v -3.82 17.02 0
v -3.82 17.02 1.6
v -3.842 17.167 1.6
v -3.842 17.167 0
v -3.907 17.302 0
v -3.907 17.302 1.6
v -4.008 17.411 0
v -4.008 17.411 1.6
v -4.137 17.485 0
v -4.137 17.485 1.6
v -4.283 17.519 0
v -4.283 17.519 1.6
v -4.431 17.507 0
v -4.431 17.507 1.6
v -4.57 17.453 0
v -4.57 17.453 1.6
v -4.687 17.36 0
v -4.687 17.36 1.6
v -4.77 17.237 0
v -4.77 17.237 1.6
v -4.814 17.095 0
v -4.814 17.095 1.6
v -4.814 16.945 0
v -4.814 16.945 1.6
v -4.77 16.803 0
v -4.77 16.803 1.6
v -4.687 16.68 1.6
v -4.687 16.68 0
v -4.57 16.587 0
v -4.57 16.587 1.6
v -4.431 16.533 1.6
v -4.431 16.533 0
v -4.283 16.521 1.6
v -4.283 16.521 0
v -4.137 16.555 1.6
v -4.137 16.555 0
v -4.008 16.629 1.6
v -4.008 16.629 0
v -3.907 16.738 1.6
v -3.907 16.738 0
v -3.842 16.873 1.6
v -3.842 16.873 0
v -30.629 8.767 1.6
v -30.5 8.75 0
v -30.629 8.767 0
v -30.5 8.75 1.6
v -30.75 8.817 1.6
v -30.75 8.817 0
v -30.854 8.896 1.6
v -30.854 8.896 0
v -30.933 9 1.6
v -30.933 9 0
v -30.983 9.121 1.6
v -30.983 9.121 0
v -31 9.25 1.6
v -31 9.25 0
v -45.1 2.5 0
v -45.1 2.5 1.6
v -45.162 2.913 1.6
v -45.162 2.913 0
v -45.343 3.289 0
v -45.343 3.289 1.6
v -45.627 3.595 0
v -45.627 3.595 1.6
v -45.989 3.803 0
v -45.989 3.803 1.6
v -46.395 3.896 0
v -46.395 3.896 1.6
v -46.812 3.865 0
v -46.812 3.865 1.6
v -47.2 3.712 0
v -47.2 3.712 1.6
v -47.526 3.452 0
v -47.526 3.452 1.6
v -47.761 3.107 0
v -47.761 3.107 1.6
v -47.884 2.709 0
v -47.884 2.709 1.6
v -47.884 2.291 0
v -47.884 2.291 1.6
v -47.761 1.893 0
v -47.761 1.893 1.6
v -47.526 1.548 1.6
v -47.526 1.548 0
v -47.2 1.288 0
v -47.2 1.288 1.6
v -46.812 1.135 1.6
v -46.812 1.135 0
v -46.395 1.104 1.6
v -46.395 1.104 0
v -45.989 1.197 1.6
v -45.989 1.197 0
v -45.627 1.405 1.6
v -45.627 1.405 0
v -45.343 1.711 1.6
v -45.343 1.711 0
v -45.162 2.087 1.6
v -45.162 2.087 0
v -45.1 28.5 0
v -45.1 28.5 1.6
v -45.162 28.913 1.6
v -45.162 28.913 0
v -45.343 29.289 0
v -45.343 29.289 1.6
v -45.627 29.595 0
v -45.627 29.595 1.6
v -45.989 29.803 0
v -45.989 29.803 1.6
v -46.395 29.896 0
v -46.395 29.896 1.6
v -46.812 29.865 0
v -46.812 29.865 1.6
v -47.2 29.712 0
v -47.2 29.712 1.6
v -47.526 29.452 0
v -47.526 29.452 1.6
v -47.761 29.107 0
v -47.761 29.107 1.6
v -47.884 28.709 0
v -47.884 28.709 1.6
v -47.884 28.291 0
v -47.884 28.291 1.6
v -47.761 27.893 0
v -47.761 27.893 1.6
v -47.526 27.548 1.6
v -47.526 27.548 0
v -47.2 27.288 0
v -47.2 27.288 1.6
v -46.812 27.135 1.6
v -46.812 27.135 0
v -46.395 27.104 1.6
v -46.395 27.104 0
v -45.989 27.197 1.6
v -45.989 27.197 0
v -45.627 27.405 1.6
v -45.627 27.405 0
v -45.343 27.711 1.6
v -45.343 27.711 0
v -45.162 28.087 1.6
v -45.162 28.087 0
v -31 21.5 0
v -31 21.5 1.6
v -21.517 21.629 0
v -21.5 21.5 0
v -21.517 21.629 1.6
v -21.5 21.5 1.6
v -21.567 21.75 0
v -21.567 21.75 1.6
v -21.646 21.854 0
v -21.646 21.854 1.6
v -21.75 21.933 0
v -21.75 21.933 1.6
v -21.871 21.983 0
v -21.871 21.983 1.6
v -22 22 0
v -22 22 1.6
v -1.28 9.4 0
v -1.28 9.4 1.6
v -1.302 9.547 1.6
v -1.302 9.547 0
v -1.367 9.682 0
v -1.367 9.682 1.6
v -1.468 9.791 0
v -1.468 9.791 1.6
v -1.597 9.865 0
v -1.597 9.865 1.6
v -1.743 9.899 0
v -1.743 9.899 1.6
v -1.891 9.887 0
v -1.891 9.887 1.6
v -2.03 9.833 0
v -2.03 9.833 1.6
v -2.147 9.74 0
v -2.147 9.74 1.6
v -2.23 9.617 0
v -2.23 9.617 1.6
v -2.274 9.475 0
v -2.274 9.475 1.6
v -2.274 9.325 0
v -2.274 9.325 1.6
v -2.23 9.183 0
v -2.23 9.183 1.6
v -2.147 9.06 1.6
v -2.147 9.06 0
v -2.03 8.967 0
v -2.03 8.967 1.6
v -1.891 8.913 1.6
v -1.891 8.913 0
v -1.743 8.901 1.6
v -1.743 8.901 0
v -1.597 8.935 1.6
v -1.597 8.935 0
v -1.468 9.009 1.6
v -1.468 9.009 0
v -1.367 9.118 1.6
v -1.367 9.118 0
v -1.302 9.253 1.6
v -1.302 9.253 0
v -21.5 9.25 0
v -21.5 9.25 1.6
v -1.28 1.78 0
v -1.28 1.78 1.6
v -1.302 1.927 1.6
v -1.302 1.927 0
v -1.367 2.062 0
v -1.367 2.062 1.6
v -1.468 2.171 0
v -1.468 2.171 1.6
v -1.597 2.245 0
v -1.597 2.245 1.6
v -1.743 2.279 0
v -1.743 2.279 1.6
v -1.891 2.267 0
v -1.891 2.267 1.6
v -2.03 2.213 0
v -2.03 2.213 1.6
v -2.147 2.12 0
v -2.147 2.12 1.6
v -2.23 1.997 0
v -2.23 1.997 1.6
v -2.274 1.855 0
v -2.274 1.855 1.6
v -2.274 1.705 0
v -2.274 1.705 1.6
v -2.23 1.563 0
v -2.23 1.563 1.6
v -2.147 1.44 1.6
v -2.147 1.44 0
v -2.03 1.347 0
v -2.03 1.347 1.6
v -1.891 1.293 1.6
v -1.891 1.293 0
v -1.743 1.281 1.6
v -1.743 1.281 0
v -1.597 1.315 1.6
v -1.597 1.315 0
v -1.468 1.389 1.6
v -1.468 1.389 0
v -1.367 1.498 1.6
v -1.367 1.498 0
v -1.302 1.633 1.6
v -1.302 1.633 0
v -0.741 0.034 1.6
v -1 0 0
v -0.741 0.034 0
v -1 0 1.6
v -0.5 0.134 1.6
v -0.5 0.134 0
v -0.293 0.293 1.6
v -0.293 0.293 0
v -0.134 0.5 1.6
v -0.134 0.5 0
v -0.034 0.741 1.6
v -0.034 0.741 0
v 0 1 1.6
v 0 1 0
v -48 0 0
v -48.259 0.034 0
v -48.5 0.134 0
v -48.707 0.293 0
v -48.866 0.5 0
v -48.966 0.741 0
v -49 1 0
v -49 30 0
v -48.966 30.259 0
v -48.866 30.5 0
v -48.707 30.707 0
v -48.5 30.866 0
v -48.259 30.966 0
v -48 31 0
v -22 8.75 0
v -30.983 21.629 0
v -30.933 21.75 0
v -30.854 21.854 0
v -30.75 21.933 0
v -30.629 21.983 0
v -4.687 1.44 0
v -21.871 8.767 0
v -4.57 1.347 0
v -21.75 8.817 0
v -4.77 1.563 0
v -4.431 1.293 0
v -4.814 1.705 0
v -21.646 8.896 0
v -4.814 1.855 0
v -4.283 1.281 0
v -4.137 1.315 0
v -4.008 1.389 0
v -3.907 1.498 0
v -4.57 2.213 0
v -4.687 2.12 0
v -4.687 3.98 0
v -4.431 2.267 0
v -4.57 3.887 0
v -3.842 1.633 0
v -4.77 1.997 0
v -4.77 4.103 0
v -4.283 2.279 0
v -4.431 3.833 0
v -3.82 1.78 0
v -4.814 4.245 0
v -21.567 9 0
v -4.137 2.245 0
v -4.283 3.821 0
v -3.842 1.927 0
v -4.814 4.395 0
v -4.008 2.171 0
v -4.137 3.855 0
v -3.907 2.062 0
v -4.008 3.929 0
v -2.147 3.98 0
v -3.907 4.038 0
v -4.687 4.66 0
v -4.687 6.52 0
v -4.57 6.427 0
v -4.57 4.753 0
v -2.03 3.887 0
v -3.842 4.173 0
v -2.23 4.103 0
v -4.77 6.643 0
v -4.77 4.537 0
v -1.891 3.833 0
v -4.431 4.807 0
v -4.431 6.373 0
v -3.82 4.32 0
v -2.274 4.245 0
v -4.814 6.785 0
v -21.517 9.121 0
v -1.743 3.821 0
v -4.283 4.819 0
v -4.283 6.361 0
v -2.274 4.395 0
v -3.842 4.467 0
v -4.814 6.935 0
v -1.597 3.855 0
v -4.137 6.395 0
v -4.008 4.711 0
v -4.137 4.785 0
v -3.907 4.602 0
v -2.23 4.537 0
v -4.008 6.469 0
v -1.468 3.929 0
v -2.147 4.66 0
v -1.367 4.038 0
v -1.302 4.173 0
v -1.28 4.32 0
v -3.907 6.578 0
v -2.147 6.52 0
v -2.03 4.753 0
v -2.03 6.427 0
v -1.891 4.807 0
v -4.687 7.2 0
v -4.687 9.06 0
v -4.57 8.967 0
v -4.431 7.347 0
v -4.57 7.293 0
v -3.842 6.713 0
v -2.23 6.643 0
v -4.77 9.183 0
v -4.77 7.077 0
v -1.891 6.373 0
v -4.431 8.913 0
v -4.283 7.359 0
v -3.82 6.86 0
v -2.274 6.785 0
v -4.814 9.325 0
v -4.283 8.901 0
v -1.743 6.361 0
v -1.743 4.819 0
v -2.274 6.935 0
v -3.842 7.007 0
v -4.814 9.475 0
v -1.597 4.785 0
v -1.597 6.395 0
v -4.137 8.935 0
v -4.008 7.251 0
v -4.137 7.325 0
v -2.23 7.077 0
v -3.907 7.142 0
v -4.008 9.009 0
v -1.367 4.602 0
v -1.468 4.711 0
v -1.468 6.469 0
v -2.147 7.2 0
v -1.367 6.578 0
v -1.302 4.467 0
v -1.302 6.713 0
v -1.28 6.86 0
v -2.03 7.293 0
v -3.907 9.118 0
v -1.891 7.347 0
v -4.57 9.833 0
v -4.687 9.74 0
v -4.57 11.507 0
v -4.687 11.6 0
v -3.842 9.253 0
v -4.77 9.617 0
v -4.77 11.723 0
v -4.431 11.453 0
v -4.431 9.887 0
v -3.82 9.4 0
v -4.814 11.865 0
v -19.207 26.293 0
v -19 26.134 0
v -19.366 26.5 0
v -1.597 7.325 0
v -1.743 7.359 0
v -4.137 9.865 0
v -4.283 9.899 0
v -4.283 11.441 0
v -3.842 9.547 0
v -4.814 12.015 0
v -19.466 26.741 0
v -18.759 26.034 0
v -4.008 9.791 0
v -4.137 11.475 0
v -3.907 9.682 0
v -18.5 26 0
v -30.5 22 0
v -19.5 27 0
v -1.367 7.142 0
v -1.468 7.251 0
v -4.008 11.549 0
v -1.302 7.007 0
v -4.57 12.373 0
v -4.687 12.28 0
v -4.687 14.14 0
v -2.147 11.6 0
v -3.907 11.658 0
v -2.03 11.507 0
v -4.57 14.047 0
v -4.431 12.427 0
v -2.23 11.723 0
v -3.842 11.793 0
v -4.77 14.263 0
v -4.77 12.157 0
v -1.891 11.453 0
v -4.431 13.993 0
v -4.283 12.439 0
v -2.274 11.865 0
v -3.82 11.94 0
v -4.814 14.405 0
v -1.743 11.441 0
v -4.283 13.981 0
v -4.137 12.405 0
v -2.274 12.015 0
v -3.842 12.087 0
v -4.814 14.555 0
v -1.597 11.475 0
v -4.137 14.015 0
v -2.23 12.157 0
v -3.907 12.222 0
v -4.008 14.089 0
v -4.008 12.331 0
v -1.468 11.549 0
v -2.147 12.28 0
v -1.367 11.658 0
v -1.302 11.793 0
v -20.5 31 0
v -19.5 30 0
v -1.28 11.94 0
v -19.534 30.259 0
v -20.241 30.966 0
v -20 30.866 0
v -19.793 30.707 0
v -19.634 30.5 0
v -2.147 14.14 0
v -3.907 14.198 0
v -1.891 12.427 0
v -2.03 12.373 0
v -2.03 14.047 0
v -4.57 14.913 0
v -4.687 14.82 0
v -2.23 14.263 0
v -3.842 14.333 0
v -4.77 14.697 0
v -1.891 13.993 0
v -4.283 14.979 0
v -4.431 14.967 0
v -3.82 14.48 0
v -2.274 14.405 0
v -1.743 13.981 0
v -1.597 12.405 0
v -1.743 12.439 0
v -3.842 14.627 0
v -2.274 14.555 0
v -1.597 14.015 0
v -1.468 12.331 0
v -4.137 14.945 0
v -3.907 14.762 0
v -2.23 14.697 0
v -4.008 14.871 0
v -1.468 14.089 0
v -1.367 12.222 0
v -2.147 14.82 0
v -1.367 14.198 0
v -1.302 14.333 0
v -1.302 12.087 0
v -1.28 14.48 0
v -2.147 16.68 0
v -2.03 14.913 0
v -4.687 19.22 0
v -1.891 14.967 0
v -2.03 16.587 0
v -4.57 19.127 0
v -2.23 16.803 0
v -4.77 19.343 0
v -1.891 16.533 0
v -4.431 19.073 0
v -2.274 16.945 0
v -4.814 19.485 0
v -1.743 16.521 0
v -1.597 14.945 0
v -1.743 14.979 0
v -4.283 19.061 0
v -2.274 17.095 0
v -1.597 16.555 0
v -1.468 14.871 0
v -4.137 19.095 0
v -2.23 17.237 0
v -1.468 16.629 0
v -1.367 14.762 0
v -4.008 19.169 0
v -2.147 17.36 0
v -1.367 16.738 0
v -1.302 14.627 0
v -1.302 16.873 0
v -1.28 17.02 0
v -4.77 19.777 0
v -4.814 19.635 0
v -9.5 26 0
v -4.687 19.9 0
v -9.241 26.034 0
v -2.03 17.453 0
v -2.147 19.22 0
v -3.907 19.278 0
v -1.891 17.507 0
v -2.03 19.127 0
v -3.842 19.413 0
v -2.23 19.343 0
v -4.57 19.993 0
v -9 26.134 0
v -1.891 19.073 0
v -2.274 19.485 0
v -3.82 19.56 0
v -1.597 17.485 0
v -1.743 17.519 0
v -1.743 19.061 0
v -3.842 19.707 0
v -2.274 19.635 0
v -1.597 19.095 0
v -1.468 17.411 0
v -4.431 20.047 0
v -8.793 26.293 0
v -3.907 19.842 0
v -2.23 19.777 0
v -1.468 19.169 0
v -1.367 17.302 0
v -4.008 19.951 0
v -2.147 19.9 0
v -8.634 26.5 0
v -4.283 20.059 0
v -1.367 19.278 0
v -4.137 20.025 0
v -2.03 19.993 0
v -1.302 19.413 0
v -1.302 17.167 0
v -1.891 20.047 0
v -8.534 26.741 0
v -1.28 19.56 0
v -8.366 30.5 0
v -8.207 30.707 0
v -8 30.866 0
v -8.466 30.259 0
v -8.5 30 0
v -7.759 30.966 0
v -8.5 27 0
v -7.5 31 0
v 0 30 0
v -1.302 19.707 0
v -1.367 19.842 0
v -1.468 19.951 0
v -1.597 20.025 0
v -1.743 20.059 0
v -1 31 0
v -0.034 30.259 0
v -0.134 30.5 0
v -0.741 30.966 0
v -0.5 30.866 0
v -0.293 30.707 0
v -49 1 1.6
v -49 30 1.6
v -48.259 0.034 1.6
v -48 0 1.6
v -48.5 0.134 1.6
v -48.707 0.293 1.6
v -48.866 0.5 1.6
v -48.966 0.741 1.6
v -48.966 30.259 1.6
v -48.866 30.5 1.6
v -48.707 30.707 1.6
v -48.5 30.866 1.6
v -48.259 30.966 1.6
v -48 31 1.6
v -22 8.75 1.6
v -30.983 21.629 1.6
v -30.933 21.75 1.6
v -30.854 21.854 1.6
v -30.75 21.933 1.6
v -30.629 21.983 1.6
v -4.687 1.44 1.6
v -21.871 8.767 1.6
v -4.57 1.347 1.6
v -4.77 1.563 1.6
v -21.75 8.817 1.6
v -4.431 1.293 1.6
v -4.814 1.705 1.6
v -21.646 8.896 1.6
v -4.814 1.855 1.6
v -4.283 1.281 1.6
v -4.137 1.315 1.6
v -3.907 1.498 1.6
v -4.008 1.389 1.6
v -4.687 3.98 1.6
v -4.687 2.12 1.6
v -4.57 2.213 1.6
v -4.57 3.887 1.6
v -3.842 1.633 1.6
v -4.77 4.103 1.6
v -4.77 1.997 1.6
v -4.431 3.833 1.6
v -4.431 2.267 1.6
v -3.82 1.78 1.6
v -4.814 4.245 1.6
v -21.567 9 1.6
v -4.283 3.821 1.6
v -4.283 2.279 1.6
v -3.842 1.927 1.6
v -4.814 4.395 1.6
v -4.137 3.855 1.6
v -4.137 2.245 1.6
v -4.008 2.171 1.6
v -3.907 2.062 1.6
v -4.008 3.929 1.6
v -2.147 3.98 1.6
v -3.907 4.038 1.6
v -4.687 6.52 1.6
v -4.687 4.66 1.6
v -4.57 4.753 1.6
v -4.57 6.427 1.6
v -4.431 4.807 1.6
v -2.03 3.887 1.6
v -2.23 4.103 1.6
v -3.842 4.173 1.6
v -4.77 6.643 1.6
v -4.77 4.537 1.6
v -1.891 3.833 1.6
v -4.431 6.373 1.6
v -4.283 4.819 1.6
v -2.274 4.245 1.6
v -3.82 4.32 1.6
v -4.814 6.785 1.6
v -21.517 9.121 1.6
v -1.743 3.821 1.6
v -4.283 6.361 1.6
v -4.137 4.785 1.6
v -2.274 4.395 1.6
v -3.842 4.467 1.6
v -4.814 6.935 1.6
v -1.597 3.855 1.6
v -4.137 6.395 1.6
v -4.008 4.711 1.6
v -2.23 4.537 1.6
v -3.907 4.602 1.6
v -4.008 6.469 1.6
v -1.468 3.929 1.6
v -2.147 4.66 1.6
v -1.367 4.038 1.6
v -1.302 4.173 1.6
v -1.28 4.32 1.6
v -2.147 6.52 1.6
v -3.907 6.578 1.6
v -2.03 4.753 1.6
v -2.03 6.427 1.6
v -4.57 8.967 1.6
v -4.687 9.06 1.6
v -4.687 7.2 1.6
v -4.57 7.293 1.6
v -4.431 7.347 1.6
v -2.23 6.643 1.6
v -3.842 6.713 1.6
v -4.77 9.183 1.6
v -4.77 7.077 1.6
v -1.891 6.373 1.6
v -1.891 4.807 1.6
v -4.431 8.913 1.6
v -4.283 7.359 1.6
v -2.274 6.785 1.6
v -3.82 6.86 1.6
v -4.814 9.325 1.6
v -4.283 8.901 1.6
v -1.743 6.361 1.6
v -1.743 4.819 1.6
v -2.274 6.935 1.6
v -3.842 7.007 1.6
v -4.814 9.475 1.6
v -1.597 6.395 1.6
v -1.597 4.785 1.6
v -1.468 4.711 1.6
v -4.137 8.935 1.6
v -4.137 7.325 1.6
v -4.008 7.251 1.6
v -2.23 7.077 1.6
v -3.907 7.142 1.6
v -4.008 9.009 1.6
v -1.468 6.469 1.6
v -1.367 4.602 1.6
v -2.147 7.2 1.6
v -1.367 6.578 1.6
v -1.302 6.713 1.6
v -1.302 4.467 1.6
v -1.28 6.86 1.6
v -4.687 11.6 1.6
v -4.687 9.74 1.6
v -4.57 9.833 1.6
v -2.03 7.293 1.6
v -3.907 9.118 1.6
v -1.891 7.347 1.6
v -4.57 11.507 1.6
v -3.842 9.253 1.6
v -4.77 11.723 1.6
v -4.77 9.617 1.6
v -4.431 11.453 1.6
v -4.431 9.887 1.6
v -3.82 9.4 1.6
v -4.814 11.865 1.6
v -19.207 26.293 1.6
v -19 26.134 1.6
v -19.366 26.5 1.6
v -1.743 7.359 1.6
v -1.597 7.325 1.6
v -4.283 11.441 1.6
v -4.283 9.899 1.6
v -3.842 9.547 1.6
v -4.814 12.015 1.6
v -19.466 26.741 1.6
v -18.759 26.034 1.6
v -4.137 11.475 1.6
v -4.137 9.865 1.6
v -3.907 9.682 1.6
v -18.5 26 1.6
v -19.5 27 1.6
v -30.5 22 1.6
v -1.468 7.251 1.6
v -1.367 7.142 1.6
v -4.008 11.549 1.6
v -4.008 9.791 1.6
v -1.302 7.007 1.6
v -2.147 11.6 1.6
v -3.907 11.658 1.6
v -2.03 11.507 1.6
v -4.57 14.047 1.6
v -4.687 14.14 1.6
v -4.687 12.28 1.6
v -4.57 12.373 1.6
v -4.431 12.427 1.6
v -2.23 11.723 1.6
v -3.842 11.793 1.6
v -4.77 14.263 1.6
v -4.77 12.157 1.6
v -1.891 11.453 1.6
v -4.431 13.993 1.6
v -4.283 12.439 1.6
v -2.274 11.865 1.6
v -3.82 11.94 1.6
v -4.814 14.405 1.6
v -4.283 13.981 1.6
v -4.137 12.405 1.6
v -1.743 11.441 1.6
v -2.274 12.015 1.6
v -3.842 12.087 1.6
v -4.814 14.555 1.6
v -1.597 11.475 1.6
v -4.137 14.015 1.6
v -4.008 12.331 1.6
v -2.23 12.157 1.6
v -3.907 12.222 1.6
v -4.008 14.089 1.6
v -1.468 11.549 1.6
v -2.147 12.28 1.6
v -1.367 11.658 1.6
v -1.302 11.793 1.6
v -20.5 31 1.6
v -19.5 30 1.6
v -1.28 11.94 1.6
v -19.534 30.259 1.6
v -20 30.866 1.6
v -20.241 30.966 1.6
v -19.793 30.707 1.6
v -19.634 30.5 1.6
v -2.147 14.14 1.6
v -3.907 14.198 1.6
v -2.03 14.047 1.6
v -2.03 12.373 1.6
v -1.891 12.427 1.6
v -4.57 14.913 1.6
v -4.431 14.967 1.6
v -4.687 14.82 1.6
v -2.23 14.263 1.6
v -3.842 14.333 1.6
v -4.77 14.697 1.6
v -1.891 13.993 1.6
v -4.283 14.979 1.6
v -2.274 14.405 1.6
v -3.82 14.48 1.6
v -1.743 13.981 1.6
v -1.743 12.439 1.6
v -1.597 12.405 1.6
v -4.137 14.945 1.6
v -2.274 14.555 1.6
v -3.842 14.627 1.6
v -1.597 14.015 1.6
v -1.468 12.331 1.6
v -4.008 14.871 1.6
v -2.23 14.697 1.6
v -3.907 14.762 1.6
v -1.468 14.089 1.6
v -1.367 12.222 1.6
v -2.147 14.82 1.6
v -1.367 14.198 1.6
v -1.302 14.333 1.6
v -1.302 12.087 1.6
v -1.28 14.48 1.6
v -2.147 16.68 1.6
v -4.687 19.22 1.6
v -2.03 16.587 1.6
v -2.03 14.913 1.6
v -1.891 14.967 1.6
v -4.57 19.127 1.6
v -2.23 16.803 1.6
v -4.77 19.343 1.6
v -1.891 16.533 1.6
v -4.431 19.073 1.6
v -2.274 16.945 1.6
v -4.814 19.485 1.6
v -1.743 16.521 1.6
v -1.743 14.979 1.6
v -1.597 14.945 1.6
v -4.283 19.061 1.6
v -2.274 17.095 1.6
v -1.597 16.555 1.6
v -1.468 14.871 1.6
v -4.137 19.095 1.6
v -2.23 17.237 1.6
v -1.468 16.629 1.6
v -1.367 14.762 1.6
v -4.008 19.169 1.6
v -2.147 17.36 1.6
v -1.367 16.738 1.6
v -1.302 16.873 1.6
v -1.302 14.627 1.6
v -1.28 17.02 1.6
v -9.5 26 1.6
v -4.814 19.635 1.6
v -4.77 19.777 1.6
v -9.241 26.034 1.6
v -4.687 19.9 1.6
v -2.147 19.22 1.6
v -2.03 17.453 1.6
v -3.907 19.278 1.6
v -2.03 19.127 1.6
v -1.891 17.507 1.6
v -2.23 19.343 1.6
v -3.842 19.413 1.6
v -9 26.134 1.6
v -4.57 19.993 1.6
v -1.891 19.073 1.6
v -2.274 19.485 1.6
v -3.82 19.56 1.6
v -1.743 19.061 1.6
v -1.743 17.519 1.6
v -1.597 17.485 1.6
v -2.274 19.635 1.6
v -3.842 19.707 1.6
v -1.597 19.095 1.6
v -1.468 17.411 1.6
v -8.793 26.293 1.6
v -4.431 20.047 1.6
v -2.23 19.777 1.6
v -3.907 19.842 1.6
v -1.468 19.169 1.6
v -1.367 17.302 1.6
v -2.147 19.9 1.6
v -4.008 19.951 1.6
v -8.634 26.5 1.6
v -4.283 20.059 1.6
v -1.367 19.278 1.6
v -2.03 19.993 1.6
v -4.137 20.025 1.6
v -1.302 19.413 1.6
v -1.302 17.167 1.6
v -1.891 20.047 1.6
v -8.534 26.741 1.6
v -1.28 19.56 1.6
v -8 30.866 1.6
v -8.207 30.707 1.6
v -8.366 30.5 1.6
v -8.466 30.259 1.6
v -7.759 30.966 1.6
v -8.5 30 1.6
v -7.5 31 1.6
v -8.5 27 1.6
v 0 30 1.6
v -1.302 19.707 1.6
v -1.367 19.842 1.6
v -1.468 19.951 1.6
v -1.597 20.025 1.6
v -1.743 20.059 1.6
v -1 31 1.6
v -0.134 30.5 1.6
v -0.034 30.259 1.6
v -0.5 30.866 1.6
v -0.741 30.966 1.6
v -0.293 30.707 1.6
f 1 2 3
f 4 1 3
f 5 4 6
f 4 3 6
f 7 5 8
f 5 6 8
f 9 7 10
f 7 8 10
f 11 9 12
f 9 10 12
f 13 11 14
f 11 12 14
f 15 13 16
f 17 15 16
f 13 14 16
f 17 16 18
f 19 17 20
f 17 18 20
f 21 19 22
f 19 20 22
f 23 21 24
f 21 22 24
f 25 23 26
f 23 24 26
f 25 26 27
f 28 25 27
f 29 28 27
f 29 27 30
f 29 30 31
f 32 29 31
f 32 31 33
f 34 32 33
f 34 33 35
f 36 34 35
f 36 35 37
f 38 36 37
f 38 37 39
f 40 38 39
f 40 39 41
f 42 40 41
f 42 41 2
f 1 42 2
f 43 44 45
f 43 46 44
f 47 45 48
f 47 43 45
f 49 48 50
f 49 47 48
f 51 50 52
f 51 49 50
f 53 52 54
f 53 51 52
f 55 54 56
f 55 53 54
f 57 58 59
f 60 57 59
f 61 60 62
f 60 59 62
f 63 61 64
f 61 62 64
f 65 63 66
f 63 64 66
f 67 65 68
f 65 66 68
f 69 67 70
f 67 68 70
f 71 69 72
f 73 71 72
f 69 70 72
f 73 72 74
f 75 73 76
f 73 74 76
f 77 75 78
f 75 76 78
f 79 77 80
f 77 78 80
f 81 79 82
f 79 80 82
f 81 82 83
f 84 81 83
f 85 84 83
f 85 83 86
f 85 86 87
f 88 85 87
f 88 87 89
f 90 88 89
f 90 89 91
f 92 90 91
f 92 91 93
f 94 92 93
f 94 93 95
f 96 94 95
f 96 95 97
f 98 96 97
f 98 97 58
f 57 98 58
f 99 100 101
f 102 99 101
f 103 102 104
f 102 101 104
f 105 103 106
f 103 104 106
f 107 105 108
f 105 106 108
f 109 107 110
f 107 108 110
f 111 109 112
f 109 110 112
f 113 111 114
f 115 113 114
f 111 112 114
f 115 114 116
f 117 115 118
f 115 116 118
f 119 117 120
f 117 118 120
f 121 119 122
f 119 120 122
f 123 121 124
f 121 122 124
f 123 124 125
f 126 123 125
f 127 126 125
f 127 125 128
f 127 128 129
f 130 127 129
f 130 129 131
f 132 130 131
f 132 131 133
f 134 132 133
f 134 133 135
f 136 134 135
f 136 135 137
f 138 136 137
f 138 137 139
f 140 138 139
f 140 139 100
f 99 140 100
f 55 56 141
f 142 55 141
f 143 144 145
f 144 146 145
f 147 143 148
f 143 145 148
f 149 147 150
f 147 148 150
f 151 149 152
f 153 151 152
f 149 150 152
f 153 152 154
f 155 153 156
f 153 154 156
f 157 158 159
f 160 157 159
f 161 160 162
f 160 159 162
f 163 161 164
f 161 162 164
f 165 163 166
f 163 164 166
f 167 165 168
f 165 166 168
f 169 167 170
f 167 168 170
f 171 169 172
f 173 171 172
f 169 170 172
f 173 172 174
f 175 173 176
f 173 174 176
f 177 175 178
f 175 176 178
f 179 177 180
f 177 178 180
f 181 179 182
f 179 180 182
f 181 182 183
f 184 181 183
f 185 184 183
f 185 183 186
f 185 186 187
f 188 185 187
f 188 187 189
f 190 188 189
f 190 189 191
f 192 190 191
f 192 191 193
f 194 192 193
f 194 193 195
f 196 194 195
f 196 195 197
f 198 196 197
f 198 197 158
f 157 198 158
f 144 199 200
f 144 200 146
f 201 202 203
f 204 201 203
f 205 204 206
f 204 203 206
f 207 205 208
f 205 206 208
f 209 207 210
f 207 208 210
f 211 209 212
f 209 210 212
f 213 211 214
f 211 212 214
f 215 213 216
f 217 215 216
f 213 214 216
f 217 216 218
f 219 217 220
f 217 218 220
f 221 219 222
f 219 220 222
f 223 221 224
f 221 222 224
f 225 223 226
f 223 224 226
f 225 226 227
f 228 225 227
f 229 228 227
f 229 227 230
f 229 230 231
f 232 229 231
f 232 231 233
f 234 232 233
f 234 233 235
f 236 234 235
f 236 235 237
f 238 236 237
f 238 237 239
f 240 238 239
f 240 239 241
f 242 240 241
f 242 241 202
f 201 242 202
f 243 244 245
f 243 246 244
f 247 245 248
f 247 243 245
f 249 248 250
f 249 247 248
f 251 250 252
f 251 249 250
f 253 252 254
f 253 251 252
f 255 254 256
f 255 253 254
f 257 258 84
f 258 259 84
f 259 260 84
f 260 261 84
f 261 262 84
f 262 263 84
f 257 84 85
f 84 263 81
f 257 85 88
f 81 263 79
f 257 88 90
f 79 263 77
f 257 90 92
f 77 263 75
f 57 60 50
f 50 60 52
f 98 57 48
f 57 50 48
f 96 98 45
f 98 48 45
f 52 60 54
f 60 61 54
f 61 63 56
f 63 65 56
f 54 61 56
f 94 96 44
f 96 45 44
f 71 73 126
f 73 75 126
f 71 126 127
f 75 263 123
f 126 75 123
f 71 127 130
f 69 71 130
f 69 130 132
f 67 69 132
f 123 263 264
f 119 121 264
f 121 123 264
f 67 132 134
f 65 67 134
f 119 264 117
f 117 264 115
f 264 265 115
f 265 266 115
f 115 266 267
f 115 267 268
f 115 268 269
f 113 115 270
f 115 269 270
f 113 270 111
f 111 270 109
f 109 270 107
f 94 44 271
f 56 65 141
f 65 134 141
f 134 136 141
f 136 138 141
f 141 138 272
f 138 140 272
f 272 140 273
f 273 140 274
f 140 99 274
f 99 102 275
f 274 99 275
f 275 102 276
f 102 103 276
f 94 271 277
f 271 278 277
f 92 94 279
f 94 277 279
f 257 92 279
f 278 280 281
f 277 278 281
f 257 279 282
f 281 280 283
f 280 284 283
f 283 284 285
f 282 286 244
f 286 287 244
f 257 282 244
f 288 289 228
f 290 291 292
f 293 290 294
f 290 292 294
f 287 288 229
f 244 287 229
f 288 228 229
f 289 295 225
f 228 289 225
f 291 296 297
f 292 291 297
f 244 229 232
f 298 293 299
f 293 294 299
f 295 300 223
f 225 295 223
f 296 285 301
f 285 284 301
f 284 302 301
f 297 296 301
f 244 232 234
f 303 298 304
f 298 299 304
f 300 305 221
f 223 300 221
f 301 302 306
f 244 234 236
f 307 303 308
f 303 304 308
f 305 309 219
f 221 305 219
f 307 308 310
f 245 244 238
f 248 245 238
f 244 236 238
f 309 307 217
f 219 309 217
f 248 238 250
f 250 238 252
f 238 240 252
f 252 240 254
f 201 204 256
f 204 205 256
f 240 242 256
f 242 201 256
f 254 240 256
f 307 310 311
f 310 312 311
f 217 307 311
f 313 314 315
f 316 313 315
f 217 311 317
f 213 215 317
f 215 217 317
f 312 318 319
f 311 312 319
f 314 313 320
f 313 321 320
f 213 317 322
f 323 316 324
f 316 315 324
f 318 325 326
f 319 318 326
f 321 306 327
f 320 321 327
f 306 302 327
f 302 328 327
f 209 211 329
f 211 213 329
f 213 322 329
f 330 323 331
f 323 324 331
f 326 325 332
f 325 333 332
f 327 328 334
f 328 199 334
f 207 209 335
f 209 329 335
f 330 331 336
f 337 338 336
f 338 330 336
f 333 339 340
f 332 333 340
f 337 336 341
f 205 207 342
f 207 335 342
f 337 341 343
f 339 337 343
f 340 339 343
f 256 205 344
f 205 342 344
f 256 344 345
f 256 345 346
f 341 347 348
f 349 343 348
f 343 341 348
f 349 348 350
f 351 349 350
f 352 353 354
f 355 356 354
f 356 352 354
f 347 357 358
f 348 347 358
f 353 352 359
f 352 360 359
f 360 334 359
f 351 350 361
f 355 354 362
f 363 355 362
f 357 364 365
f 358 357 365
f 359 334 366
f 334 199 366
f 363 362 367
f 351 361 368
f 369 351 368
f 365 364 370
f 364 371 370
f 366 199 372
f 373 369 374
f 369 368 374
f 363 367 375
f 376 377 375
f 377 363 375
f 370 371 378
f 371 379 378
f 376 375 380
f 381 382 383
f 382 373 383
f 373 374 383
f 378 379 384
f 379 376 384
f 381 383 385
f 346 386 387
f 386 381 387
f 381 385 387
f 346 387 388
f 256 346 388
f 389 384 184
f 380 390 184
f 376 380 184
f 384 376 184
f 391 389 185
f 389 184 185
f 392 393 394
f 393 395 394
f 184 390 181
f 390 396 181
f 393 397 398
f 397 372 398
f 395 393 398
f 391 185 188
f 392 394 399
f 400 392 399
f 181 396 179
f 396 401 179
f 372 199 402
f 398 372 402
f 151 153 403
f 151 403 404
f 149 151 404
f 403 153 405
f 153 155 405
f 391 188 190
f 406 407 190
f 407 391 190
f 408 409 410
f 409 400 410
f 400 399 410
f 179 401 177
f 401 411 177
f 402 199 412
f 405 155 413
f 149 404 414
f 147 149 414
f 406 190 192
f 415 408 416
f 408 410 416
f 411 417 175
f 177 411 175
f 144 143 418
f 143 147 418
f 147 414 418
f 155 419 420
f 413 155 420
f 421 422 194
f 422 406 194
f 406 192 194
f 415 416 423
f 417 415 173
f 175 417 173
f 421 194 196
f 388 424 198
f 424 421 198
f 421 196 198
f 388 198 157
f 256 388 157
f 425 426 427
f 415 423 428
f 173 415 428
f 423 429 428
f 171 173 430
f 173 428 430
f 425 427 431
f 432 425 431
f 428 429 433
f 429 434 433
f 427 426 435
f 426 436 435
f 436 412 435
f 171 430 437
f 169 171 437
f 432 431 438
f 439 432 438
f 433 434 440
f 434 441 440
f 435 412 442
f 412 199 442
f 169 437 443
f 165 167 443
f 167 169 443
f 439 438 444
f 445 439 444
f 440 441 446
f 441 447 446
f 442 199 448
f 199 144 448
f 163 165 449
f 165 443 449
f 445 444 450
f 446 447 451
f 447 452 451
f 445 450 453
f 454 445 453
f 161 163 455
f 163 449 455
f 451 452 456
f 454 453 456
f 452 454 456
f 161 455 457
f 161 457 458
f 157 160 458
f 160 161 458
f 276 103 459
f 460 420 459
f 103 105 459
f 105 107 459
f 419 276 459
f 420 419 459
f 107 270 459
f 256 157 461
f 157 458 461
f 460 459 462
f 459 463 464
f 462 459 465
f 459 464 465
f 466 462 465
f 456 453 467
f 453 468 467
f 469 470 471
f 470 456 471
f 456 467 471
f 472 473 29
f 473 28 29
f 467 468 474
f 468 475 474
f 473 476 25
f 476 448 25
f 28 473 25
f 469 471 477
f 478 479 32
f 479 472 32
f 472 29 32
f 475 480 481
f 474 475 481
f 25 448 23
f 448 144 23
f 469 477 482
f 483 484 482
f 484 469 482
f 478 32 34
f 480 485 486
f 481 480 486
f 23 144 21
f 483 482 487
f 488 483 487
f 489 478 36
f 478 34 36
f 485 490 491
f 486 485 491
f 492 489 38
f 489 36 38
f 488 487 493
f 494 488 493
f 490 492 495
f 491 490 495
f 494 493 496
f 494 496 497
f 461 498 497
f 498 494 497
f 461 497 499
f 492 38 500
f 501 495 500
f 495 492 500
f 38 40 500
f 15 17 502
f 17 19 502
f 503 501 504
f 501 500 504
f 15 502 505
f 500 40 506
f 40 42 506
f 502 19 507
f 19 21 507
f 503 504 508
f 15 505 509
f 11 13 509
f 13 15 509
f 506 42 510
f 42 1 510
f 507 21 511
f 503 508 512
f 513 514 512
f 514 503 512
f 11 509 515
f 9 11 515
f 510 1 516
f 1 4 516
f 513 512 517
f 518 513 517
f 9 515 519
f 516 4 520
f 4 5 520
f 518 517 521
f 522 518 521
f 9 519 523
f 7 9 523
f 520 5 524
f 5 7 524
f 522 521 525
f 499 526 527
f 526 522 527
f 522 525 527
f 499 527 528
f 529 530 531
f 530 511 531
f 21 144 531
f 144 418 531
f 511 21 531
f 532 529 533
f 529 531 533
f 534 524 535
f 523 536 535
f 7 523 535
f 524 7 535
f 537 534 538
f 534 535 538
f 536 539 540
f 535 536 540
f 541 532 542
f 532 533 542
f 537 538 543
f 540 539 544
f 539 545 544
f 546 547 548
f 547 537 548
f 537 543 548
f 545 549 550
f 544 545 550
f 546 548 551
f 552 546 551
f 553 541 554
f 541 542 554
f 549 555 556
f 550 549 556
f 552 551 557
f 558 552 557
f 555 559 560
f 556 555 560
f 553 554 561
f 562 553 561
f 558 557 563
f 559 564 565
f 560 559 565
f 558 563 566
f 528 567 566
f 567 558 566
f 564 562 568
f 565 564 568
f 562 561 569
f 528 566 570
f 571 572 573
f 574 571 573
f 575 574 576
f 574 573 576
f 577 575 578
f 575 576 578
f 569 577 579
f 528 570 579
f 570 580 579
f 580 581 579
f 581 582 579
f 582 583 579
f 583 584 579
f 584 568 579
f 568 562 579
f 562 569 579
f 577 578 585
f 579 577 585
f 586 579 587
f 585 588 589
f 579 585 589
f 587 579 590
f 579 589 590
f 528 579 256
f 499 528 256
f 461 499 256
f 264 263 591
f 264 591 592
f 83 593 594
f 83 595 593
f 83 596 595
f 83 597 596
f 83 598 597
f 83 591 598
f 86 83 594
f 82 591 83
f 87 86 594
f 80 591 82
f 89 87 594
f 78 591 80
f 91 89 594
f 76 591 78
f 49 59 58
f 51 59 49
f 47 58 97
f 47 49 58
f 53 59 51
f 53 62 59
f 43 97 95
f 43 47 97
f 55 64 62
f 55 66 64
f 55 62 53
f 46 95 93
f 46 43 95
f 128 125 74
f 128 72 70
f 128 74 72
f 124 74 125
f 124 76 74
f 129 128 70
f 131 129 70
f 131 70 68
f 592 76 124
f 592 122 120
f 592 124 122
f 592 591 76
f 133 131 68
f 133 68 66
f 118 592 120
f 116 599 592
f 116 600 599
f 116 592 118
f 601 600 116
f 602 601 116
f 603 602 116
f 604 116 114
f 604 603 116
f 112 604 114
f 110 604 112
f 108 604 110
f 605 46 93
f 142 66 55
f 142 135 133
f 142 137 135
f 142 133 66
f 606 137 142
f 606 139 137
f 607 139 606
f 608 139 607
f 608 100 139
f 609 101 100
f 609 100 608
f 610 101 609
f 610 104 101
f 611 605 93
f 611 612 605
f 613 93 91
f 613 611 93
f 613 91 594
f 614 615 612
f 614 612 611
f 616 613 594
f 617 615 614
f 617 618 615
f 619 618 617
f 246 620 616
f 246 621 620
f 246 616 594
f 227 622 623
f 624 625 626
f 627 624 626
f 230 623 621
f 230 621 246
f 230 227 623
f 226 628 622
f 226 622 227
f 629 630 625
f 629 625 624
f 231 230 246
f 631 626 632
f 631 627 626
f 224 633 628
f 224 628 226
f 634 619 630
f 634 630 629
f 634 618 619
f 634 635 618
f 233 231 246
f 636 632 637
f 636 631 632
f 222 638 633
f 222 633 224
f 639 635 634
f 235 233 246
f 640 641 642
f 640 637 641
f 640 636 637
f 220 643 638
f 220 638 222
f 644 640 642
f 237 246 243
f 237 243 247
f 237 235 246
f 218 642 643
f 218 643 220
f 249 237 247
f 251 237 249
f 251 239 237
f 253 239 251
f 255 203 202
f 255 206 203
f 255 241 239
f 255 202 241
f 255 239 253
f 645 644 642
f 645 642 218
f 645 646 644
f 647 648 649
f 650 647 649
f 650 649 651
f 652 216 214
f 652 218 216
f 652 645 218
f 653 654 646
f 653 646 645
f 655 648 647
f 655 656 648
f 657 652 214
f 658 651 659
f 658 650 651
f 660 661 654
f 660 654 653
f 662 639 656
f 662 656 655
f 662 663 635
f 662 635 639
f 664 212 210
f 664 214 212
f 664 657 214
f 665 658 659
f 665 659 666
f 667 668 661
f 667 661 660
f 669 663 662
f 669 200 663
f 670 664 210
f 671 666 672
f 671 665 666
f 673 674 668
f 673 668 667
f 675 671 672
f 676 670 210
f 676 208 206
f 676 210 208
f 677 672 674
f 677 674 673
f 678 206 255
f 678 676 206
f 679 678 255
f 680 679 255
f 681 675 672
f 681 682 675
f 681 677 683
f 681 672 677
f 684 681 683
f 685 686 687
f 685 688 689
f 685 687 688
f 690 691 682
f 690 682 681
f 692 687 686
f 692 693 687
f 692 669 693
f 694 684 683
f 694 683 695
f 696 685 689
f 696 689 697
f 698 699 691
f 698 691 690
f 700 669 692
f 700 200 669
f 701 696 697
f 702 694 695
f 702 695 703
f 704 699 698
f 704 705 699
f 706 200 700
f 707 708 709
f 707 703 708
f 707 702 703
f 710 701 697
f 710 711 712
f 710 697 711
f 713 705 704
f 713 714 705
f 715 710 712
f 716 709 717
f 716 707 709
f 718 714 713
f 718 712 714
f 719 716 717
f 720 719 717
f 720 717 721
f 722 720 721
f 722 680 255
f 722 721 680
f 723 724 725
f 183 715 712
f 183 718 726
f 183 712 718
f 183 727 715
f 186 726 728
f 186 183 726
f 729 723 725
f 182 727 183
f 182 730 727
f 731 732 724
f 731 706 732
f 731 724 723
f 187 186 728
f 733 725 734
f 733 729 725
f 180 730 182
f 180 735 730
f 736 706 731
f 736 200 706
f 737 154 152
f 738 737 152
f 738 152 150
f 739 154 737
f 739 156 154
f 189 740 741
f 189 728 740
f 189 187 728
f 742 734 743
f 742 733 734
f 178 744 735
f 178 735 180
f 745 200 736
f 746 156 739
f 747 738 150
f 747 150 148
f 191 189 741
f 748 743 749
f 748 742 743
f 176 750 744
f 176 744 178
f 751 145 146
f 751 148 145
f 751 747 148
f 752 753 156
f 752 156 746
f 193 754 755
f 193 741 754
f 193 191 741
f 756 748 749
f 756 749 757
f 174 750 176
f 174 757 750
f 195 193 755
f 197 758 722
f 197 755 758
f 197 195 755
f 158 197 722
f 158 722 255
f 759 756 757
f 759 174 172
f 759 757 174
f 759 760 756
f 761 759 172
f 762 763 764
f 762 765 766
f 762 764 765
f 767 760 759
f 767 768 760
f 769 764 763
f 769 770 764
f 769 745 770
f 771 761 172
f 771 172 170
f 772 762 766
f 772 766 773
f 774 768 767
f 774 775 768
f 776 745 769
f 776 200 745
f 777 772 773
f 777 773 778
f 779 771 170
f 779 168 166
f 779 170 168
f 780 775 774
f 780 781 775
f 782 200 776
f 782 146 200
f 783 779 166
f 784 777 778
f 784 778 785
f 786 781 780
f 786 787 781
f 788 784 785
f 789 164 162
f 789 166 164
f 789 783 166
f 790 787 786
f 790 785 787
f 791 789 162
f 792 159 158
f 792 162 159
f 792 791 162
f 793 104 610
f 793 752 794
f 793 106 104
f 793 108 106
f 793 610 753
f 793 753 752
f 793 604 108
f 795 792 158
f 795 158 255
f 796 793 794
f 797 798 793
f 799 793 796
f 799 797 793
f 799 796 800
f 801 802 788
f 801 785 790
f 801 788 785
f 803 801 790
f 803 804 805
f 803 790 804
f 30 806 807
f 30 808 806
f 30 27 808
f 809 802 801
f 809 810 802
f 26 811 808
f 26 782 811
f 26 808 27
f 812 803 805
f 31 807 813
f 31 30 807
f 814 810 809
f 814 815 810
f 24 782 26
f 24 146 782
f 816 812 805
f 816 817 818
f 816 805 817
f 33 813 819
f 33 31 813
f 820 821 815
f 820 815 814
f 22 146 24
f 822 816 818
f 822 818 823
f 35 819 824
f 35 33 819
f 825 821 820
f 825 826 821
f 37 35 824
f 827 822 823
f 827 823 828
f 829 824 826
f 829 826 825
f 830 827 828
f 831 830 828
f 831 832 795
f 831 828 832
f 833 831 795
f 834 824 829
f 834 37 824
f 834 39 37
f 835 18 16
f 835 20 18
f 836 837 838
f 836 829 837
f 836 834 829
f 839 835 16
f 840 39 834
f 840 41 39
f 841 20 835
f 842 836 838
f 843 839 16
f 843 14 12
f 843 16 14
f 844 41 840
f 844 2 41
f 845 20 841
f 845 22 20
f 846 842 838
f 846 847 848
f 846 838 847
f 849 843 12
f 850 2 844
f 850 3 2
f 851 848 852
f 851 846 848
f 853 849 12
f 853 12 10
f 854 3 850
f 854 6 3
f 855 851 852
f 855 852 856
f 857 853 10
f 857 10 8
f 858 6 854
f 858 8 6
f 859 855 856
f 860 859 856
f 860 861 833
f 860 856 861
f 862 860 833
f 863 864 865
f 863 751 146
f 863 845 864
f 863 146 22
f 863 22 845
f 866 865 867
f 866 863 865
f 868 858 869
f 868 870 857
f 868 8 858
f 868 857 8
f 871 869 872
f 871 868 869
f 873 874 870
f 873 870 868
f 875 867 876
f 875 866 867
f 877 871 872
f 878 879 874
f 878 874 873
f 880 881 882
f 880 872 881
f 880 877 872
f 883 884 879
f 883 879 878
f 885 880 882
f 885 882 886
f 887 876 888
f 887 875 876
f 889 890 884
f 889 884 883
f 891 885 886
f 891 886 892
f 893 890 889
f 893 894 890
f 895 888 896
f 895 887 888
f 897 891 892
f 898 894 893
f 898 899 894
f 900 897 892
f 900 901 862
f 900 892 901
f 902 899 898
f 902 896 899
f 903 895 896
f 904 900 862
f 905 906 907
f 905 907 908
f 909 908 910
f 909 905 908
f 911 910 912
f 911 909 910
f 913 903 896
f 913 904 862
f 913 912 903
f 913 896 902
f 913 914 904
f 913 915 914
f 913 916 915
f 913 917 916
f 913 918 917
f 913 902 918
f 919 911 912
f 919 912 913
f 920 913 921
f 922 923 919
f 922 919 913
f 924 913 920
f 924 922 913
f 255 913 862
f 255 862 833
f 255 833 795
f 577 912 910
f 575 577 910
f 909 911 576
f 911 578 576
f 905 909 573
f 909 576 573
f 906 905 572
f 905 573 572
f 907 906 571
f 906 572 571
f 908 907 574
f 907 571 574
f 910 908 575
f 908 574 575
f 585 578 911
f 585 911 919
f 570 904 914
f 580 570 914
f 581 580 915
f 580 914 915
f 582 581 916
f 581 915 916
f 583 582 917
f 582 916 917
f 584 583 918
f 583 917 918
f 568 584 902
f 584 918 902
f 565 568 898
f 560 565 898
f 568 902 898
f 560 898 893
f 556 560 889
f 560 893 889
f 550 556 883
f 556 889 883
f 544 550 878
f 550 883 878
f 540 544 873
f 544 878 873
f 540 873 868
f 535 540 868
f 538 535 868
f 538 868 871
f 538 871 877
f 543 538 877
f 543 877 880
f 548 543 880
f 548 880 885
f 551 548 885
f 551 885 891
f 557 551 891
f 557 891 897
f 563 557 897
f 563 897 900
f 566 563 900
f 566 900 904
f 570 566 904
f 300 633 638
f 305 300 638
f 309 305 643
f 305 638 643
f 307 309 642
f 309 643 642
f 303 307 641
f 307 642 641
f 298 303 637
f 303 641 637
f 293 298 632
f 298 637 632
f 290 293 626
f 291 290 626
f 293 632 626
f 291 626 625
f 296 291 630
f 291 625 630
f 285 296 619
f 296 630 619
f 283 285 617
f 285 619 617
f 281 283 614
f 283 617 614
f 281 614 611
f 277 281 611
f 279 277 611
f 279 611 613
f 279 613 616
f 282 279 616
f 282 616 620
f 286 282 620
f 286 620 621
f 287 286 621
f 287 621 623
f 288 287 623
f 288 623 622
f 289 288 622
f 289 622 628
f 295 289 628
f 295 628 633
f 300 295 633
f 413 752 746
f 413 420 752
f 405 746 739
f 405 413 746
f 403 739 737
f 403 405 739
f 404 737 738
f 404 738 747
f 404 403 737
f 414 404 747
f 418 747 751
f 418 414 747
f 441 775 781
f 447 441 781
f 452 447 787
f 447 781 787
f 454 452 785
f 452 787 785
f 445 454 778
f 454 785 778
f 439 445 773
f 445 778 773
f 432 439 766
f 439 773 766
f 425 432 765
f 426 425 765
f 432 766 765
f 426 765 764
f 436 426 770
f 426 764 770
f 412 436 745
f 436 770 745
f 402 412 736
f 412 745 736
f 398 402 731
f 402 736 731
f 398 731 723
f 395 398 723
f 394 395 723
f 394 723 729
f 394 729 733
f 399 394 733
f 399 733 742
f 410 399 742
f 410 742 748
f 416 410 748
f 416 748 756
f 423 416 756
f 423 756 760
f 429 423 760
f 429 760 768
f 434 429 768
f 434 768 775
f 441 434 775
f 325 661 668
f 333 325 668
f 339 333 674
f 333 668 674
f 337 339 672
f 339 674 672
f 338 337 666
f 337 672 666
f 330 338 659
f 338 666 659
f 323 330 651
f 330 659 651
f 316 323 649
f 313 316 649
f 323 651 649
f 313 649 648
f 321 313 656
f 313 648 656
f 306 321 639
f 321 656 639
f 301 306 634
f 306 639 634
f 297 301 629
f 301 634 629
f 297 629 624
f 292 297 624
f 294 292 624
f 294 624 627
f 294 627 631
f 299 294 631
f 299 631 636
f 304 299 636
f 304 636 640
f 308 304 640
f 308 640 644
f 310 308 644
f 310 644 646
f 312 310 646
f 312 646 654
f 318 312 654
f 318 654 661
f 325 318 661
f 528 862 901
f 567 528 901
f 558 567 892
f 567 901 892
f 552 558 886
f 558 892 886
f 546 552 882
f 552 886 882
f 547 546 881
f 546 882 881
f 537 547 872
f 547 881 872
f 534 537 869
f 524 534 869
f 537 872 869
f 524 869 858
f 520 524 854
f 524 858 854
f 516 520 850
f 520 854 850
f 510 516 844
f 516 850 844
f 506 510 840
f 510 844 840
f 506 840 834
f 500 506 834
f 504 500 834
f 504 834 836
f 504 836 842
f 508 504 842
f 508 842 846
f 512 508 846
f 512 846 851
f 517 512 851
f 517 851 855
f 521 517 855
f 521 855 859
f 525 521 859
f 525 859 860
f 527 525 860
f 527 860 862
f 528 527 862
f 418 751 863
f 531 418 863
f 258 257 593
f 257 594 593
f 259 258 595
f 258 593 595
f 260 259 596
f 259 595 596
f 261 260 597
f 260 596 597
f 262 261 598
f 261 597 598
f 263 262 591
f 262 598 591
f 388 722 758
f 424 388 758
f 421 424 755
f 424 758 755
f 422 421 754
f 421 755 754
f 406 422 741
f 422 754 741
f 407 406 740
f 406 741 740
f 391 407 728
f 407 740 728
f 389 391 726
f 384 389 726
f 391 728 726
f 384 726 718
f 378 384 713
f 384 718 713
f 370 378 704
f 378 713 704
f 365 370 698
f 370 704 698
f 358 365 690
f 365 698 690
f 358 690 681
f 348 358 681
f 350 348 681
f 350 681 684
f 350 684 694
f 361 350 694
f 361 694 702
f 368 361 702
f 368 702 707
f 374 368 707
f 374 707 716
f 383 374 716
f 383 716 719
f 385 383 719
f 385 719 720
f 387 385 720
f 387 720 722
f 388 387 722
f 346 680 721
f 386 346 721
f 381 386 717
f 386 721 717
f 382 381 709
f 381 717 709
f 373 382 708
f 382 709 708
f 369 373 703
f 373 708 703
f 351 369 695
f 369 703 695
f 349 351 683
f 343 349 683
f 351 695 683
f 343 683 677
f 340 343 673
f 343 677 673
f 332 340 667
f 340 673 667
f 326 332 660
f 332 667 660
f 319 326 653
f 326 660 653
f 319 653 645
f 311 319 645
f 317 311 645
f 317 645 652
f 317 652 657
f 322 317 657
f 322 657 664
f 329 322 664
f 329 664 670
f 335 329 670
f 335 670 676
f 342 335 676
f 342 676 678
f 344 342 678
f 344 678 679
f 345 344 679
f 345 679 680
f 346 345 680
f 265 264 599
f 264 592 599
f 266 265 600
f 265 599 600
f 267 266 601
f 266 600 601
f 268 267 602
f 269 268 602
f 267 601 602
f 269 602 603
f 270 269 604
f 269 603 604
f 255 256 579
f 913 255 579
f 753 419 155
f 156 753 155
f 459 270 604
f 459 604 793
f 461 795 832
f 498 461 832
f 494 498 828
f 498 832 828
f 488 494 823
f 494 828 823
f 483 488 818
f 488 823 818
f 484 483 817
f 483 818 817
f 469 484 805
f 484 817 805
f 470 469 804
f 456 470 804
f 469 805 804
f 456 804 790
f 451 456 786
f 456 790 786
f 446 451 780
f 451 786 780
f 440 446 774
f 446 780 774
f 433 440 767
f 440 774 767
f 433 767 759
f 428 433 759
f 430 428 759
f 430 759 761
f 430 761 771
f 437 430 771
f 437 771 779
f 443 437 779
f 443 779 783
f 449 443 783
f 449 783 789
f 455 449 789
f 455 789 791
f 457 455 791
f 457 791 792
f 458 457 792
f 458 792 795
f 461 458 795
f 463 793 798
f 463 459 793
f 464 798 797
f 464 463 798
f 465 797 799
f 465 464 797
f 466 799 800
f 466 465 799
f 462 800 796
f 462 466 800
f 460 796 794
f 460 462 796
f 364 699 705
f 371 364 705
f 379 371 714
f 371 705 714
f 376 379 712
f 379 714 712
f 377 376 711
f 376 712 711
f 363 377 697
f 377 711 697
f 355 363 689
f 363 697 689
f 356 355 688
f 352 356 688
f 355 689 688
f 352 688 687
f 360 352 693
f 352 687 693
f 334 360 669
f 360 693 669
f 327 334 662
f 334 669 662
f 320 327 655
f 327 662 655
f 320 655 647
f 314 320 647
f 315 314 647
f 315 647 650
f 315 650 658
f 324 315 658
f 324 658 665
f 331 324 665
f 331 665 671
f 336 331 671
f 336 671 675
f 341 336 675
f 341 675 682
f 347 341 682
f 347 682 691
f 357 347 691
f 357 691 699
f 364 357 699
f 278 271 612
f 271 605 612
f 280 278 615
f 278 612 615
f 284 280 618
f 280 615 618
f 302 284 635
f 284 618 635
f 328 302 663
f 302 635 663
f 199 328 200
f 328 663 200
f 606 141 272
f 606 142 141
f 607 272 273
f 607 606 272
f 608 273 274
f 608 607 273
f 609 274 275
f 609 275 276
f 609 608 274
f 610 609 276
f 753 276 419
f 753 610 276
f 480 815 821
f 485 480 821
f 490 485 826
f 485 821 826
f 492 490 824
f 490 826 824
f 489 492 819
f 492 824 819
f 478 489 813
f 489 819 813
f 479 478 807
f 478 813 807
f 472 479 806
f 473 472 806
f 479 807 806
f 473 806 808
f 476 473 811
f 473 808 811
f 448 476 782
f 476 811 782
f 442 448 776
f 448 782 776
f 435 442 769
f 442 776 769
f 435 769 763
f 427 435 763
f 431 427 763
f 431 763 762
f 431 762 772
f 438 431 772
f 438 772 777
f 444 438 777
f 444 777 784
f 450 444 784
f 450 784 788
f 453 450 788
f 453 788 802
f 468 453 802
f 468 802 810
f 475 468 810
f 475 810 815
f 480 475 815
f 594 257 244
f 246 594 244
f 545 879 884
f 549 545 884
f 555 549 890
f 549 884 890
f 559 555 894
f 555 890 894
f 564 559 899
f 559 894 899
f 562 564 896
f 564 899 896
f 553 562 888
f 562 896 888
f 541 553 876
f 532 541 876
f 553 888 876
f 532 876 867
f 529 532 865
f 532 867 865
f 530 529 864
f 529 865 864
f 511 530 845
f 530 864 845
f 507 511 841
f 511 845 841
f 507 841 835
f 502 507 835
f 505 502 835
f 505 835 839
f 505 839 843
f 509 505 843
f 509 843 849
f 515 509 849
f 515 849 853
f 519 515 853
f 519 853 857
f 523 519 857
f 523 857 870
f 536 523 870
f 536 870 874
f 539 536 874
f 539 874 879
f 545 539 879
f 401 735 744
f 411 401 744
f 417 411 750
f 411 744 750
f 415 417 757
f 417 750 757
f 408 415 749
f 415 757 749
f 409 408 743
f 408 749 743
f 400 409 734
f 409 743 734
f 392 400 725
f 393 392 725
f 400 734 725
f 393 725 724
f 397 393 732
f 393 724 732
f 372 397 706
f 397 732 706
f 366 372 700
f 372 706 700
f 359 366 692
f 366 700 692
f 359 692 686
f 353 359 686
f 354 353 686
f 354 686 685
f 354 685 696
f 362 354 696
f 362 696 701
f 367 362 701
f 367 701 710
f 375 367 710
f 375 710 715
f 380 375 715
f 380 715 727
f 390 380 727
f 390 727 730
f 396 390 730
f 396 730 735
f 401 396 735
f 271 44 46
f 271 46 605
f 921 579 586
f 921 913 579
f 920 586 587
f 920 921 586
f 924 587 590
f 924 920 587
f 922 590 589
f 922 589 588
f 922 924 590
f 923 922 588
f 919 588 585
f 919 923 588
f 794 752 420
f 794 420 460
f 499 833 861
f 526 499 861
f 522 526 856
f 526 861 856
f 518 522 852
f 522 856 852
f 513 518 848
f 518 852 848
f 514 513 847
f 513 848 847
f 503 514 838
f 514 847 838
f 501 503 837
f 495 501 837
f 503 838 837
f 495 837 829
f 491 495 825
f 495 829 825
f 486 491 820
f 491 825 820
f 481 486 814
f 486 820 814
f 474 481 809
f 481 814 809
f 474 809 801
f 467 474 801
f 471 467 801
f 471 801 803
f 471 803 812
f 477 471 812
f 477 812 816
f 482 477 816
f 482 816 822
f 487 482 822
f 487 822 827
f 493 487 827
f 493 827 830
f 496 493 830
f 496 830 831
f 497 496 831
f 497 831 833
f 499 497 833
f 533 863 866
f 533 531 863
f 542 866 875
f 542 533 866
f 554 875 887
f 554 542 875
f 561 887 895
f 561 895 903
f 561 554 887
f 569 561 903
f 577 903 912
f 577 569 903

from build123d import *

# Parameters (mm, degrees)
SKETCH001_W         = 49
SKETCH001_H         = 31
SKETCH001_W_2       = 9.5
SKETCH001_H_2       = 13.25
PAD_DEPTH           = 1.6
SKETCH002_R         = 0.5
HOLE_DEPTH          = 25
LINEARPATTERN_COUNT = 8
LINEARPATTERN_PITCH = 2.54
SKETCH003_W         = 11
SKETCH003_H         = 5
POCKET_DEPTH        = 1.601
SKETCH004_R         = 1.4
HOLE001_DEPTH       = 25
FILLET_R            = 1
FILLET001_R         = 0.5
FILLET002_R         = 1


with BuildPart() as part:
    # Sketch001 → Pad (new body)
    with BuildSketch(Plane.XY):
        with Locations((-24.5, 15.5)):
            Rectangle(SKETCH001_W, SKETCH001_H)
        with Locations((-26.25, 15.375)):
            Rectangle(SKETCH001_W_2, SKETCH001_H_2, mode=Mode.SUBTRACT)
    extrude(amount=PAD_DEPTH)

    # Sketch002 (on Face10 of Pad) → Hole (cut)
    with BuildSketch(Plane.XY.offset(1.6)):
        with Locations((-1.78, 1.78)):
            Circle(SKETCH002_R)
        with Locations((-4.32, 1.78)):
            Circle(SKETCH002_R)
    hole = extrude(amount=-HOLE_DEPTH, mode=Mode.SUBTRACT)

    # LinearPattern: Hole ×8
    with Locations(*[(0, i * LINEARPATTERN_PITCH, 0) for i in range(1, LINEARPATTERN_COUNT)]):
        add(hole, mode=Mode.SUBTRACT)

    # Sketch003 (on Face5 of LinearPattern) → Pocket (cut, through all)
    with BuildSketch(Plane.XY.offset(1.6)):
        with Locations((-14, 28.5)):
            Rectangle(SKETCH003_W, SKETCH003_H)
    extrude(amount=-POCKET_DEPTH, mode=Mode.SUBTRACT)

    # Sketch004 (on Face5 of Pocket) → Hole001 (cut)
    with BuildSketch(Plane.XY.offset(1.6)):
        with Locations((-46.5, 28.5)):
            Circle(SKETCH004_R)
        with Locations((-46.5, 2.5)):
            Circle(SKETCH004_R)
    extrude(amount=-HOLE001_DEPTH, mode=Mode.SUBTRACT)

    # Fillet
    fillet_edges = [part.edges().sort_by_distance(p)[0] for p in [
        (-8.5, 26, 0.8),
        (-19.5, 26, 0.8),
        (-19.5, 31, 0.8),
        (-8.5, 31, 0.8),
        (0, 31, 0.8),
        (0, 0, 0.8),
    ]]
    fillet(fillet_edges, radius=FILLET_R)

    # Fillet001
    fillet001_edges = [part.edges().sort_by_distance(p)[0] for p in [
        (-21.5, 22, 0.8),
        (-21.5, 8.75, 0.8),
        (-31, 8.75, 0.8),
        (-31, 22, 0.8),
    ]]
    fillet(fillet001_edges, radius=FILLET001_R)

    # Fillet002
    fillet002_edges = [part.edges().sort_by_distance(p)[0] for p in [
        (-49, 31, 0.8),
        (-49, 0, 0.8),
    ]]
    fillet(fillet002_edges, radius=FILLET002_R)


solid = part.part
